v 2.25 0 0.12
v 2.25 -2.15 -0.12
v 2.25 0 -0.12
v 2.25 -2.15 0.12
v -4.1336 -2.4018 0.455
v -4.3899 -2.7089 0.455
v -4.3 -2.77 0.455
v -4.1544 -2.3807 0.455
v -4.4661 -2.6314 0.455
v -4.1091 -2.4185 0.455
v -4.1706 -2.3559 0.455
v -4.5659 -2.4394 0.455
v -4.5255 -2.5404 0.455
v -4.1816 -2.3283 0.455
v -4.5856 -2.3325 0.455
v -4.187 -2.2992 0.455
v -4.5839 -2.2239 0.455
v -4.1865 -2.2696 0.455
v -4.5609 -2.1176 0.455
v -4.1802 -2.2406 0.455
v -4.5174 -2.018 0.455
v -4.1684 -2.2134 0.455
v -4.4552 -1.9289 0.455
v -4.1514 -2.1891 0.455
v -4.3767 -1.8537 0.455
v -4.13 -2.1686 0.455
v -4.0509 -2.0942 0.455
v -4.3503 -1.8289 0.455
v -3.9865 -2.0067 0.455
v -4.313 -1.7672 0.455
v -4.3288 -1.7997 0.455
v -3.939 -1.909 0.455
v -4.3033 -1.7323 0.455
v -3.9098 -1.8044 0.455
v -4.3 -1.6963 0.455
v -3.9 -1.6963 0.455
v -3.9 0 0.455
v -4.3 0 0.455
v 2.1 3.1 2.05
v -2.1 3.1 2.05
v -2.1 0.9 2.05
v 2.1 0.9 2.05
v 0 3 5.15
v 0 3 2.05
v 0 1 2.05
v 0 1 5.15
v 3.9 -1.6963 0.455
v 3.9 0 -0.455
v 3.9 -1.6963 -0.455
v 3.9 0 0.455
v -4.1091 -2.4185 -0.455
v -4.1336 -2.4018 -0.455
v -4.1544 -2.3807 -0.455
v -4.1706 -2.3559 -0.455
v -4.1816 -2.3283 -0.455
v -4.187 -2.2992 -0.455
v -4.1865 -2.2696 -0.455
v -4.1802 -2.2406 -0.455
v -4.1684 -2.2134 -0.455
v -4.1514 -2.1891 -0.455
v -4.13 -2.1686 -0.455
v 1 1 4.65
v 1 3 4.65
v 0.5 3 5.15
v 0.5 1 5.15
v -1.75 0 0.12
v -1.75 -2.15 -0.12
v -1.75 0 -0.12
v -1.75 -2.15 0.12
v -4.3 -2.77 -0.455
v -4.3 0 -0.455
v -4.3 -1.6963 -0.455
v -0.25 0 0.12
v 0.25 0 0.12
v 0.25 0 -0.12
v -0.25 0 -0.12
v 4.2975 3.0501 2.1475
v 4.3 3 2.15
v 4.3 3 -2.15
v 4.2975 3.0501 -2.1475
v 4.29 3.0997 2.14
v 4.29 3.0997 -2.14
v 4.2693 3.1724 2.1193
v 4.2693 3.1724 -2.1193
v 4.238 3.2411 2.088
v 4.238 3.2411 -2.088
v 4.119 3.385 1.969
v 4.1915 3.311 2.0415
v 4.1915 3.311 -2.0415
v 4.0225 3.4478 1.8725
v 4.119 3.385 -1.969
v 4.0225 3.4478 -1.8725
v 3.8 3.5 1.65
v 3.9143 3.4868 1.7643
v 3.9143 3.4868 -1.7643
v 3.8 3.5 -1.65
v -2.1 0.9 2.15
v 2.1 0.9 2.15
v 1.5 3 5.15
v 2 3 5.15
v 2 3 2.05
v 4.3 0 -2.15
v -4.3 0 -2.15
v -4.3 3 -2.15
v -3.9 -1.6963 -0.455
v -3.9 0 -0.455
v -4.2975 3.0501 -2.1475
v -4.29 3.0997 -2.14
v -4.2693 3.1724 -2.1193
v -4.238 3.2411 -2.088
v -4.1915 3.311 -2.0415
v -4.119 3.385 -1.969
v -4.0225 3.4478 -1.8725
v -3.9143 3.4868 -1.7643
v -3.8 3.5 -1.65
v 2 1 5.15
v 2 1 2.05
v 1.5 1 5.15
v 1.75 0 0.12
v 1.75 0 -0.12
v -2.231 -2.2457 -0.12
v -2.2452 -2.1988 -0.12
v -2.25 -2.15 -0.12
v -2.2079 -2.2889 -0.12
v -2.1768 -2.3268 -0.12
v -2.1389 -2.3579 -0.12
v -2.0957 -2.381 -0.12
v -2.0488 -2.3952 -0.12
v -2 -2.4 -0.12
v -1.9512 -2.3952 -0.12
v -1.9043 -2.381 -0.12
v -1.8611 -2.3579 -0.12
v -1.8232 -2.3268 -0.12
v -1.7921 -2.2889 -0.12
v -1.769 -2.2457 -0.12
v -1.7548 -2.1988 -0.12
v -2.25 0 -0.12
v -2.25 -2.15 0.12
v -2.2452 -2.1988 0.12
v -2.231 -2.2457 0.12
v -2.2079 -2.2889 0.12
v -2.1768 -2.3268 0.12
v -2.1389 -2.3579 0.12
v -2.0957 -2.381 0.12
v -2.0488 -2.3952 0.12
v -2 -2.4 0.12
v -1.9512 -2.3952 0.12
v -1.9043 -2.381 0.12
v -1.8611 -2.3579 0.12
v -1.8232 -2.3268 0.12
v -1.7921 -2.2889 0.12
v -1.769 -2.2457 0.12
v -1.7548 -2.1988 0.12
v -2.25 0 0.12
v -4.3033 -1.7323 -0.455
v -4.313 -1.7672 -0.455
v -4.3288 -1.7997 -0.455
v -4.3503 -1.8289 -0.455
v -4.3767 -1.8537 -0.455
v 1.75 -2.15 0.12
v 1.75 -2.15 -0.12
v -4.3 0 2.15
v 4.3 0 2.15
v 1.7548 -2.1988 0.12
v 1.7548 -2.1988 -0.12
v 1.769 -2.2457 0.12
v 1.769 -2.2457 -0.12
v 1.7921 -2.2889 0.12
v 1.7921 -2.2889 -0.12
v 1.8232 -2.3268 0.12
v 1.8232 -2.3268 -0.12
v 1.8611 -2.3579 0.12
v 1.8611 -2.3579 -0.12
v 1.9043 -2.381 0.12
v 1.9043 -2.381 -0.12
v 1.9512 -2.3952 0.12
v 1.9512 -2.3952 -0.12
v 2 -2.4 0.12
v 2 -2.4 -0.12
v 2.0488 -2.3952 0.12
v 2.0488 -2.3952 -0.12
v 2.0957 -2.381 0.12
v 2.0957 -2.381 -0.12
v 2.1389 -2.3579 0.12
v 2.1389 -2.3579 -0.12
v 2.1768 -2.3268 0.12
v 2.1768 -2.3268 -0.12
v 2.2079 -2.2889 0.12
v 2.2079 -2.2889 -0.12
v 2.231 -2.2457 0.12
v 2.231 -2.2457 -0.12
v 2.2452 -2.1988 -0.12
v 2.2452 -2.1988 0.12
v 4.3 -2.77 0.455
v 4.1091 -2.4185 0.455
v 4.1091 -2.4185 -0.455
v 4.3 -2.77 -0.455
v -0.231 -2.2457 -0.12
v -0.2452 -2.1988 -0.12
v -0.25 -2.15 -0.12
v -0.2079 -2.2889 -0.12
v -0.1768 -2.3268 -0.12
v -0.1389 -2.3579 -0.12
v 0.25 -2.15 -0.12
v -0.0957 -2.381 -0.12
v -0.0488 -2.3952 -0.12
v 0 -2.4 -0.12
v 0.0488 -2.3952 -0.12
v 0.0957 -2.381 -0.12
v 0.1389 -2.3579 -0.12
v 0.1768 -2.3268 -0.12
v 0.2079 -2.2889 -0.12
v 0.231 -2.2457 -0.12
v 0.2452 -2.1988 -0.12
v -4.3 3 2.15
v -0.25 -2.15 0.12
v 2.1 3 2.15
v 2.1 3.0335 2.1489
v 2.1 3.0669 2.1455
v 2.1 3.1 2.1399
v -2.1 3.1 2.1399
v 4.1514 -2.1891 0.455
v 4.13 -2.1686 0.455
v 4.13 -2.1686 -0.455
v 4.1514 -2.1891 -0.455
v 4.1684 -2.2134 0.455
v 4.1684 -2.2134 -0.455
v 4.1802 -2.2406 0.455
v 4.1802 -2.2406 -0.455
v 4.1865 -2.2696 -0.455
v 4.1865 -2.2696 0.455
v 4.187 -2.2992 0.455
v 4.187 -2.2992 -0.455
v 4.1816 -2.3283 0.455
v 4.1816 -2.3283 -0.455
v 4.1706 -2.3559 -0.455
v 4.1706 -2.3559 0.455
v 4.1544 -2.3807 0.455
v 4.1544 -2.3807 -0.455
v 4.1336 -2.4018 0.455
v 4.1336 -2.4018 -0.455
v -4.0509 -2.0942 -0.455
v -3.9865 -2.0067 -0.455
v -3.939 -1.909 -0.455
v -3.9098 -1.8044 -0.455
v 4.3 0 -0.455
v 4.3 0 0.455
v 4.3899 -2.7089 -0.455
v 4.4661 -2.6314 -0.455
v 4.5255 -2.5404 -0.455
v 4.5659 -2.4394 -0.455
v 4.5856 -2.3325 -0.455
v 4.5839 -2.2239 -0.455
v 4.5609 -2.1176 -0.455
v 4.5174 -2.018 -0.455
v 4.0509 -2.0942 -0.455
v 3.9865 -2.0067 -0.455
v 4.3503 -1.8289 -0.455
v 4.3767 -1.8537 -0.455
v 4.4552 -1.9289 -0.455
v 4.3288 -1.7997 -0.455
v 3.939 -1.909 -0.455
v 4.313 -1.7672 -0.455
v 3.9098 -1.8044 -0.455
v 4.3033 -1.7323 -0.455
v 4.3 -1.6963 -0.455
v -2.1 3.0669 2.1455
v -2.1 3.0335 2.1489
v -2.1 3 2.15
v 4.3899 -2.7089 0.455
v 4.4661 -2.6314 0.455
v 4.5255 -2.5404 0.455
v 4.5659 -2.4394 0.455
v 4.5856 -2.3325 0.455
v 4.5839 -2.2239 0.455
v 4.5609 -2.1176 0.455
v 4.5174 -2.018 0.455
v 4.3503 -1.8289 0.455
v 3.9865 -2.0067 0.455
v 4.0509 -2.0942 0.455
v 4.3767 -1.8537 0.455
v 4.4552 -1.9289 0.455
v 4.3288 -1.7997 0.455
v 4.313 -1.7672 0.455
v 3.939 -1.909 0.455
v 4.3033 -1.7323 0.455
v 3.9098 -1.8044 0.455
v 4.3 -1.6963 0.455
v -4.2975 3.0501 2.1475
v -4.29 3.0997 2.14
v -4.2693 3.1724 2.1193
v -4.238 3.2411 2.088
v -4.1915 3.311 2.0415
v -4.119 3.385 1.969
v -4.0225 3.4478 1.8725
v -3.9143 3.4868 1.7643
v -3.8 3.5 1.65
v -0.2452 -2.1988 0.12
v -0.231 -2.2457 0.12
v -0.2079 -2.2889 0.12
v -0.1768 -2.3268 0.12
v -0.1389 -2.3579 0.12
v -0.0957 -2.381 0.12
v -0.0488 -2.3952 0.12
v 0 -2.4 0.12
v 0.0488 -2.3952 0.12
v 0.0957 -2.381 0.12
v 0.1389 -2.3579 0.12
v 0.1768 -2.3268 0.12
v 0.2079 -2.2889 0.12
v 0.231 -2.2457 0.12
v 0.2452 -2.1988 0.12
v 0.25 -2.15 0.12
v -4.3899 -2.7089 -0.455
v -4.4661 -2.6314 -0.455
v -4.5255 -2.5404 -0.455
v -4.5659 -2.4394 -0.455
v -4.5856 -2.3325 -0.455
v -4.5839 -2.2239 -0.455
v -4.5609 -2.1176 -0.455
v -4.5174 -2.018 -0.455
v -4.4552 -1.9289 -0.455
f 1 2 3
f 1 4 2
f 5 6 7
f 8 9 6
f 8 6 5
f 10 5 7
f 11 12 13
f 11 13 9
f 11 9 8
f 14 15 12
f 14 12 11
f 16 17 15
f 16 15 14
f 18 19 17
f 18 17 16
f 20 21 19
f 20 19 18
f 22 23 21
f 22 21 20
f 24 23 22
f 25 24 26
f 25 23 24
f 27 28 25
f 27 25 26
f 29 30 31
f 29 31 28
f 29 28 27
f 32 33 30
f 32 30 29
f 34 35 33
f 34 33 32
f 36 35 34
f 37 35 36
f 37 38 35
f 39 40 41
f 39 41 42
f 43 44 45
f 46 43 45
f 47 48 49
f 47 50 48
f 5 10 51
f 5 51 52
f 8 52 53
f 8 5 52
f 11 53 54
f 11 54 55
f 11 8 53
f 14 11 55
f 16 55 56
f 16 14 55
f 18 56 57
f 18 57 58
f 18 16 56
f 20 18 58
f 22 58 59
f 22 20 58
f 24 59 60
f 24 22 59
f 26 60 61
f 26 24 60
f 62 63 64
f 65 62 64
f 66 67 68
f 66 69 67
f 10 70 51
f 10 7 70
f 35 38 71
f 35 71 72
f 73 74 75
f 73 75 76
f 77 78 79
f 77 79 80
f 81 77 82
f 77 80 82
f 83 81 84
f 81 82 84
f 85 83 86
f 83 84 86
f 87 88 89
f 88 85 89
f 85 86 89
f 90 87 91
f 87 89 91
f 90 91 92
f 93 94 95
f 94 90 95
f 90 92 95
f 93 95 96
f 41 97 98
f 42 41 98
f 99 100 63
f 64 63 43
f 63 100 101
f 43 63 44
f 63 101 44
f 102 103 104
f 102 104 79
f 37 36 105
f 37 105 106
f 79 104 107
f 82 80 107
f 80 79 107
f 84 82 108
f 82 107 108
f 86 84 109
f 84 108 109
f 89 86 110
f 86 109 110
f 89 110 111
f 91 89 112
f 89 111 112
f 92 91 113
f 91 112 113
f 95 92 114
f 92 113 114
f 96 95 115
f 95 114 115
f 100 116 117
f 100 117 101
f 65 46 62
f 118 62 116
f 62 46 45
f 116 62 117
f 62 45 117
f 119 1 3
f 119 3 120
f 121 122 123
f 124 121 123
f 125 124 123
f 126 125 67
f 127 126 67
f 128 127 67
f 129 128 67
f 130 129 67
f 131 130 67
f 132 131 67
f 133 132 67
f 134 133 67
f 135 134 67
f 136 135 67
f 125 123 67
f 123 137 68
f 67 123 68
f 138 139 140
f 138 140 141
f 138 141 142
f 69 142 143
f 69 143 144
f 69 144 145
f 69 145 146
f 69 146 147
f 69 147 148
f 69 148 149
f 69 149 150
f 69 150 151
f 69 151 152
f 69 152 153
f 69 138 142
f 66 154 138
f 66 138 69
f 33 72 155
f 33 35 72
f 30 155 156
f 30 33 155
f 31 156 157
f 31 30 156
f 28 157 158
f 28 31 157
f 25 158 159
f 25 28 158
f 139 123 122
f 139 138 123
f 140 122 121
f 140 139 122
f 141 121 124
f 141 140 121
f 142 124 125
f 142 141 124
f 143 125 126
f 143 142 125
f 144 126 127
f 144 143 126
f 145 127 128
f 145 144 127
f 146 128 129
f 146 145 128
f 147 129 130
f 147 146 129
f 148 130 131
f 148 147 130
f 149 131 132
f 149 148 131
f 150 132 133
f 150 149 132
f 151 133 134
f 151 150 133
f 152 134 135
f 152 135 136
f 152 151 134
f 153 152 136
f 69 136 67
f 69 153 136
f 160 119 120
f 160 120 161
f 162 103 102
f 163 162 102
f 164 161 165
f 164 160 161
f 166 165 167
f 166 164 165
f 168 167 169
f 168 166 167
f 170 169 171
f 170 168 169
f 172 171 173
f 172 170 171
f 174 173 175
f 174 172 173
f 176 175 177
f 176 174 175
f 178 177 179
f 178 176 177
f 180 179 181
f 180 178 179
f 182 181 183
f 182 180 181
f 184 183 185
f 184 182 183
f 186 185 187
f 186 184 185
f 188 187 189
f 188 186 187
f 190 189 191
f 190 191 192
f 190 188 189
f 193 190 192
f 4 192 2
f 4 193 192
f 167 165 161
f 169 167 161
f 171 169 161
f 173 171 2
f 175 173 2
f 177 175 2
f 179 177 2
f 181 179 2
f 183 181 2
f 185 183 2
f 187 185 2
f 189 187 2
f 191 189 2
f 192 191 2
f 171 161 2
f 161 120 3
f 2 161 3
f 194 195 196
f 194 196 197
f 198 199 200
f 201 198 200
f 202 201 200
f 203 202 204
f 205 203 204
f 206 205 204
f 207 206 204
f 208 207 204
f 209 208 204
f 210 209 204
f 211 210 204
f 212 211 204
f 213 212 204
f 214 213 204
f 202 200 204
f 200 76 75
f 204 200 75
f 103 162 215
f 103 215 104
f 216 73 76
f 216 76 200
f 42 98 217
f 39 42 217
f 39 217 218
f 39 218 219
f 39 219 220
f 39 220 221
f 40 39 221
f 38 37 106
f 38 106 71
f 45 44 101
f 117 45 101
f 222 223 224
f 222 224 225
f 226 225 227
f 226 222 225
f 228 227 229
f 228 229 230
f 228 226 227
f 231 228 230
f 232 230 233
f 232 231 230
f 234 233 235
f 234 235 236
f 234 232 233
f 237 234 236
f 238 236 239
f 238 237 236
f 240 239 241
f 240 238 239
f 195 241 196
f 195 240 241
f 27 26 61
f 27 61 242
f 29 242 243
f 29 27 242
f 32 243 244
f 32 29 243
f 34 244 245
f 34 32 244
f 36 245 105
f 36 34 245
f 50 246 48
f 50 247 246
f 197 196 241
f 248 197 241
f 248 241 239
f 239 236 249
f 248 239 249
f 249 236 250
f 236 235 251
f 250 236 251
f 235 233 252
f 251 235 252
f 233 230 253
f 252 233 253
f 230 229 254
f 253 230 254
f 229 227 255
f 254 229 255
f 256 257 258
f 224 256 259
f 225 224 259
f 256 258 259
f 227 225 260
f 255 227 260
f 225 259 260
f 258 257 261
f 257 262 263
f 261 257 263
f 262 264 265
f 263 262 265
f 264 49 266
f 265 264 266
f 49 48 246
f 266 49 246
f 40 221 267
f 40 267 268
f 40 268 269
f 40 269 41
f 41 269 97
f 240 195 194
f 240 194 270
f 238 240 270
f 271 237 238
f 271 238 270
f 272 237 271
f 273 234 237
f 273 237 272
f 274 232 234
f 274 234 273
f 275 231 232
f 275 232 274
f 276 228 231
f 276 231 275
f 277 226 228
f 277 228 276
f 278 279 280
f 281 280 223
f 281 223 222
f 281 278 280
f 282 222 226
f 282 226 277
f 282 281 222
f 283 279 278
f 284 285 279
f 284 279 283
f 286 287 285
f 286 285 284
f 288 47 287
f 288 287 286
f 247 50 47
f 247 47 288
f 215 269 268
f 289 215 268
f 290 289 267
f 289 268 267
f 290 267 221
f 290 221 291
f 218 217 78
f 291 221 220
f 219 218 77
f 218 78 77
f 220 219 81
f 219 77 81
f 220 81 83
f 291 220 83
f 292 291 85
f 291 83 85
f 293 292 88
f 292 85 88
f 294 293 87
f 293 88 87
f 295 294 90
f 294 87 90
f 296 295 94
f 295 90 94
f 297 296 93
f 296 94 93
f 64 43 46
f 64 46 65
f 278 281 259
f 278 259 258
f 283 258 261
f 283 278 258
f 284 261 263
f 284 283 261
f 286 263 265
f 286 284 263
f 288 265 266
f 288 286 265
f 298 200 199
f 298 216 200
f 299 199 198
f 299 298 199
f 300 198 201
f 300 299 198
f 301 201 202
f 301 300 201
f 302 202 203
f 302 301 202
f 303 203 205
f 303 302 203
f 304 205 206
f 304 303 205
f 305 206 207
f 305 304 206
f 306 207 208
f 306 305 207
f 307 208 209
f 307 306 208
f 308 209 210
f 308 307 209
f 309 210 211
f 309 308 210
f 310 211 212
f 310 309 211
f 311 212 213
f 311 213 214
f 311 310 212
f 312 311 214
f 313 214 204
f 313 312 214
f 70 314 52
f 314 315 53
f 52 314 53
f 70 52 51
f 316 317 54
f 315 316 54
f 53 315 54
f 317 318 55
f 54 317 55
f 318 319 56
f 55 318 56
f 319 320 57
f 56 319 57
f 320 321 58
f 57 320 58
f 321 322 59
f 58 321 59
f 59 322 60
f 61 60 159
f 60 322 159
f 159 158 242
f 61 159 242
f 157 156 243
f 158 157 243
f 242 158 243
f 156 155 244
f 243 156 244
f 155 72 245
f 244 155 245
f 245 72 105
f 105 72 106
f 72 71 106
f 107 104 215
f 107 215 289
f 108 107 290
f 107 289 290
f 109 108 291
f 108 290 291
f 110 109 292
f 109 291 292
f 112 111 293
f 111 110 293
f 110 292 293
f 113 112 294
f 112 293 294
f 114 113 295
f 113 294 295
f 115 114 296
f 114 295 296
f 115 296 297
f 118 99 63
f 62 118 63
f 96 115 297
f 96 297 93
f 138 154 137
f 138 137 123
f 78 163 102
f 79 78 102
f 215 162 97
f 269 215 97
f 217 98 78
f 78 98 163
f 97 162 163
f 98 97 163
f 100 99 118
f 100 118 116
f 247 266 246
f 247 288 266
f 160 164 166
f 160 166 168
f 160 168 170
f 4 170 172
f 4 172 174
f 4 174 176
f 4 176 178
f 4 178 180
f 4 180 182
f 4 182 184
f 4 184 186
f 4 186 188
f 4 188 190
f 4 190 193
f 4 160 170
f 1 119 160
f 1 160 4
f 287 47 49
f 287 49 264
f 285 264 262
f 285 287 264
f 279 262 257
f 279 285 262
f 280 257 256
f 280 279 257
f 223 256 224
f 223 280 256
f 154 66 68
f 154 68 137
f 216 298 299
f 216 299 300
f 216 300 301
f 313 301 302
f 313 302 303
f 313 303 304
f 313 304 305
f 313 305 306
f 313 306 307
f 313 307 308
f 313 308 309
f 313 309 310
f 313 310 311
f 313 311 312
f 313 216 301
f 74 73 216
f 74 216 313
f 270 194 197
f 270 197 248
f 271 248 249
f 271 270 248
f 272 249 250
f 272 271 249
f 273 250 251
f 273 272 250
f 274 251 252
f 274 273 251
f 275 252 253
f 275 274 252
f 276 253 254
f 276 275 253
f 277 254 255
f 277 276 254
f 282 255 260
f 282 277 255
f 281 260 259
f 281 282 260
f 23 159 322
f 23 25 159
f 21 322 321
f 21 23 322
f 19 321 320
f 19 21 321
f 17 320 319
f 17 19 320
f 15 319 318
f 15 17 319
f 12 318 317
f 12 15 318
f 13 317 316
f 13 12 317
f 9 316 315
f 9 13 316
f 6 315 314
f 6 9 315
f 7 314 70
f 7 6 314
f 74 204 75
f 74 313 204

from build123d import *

# Parameters (mm, degrees)
SKETCH1_W             = 8.6
SKETCH1_H             = 4.3
BOSS_EXTRUDE1_DEPTH   = 3.5
BOSS_EXTRUDE2_DEPTH   = 0.455
BOSS_EXTRUDE2_2_DEPTH = 0.455
BOSS_EXTRUDE3_DEPTH   = 0.12
BOSS_EXTRUDE3_2_DEPTH = 0.12
BOSS_EXTRUDE3_3_DEPTH = 0.12
CUT_EXTRUDE1_DEPTH    = 0.1
BOSS_EXTRUDE4_DEPTH   = 3.1
CUT_EXTRUDE2_DEPTH    = 9.992249788
FILLET1_R             = 0.5


with BuildPart() as part:
    # Sketch1 → Boss-Extrude1 (new body)
    with BuildSketch(Plane(origin=(0, 0, 0), x_dir=(1, 0, 0), z_dir=(0, 1, 0))):
        Rectangle(SKETCH1_W, SKETCH1_H)
    extrude(amount=BOSS_EXTRUDE1_DEPTH)

    # Sketch4 → Cut-Extrude1 (cut)
    with BuildSketch(Plane.XY.offset(2.15)):
        Polygon((2.1, 0.9), (2.1, 3.1), (1.5, 3.1), (1, 3.1), (0.5, 3.1), (-0.5, 3.1), (-1, 3.1), (-1.5, 3.1), (-2.1, 3.1), (-2.1, 0.9), (-1.5, 0.9), (-1, 0.9), (-0.5, 0.9), (0.5, 0.9), (1, 0.9), (1.5, 0.9), align=None)
    extrude(amount=-CUT_EXTRUDE1_DEPTH, mode=Mode.SUBTRACT)

    # Fillet1
    # the kernel refuses this fillet: 0.5 mm, written as the material it takes off along each edge
    with BuildSketch(Plane(origin=(-4.3, 3.5, 3.4), x_dir=(1, 0, 0), z_dir=(0, 0, -1))) as fillet1_piece_1:
        with BuildLine():
            CenterArc((FILLET1_R, FILLET1_R), FILLET1_R, 180, 90)
            Line((0, FILLET1_R), (0, 0))
            Line((0, 0), (FILLET1_R, 0))
        make_face()
    extrude(amount=6.8, mode=Mode.SUBTRACT)
    with BuildSketch(Plane(origin=(-5.55, 3.5, -2.15), x_dir=(0, 0, 1), z_dir=(1, 0, 0))) as fillet1_piece_2:
        with BuildLine():
            CenterArc((FILLET1_R, FILLET1_R), FILLET1_R, 180, 90)
            Line((0, FILLET1_R), (0, 0))
            Line((0, 0), (FILLET1_R, 0))
        make_face()
    extrude(amount=11.1, mode=Mode.SUBTRACT)
    with BuildSketch(Plane(origin=(4.3, 3.5, -3.4), x_dir=(0, -1, 0), z_dir=(0, 0, 1))) as fillet1_piece_3:
        with BuildLine():
            CenterArc((FILLET1_R, -FILLET1_R), FILLET1_R, 90, 90)
            Line((0, -FILLET1_R), (0, 0))
            Line((0, 0), (FILLET1_R, 0))
        make_face()
    extrude(amount=6.8, mode=Mode.SUBTRACT)
    with BuildSketch(Plane(origin=(5.55, 3.5, 2.15), x_dir=(0, -1, 0), z_dir=(-1, 0, 0))) as fillet1_piece_4:
        with BuildLine():
            CenterArc((FILLET1_R, -FILLET1_R), FILLET1_R, 90, 90)
            Line((0, -FILLET1_R), (0, 0))
            Line((0, 0), (FILLET1_R, 0))
        make_face()
    extrude(amount=11.1, mode=Mode.SUBTRACT)


with BuildPart() as body_2:
    # Sketch2 → Boss-Extrude2 (new, symmetric)
    with BuildSketch(Plane.XY):
        with BuildLine():
            Line((3.9, 0), (3.9, -1.696266343))
            ThreePointArc((3.9, -1.696266343), (3.960555842, -1.958944854), (4.13, -2.16860097))
            ThreePointArc((4.13, -2.16860097), (4.18697768, -2.299191552), (4.109090909, -2.41849791))
            Line((4.109090909, -2.41849791), (4.3, -2.77))
            ThreePointArc((4.3, -2.77), (4.585584827, -2.332543353), (4.376666667, -1.853711219))
            ThreePointArc((4.376666667, -1.853711219), (4.320185281, -1.783825846), (4.3, -1.696266343))
            Line((4.3, -1.696266343), (4.3, 0))
            Line((4.3, 0), (3.9, 0))
        make_face()
    extrude(amount=BOSS_EXTRUDE2_DEPTH, both=True)


with BuildPart() as body_3:
    # Sketch2 → Boss-Extrude2 2 (new, symmetric)
    with BuildSketch(Plane.XY):
        with BuildLine():
            Line((-4.3, -2.77), (-4.109090909, -2.41849791))
            ThreePointArc((-4.109090909, -2.41849791), (-4.18697768, -2.299191552), (-4.13, -2.16860097))
            ThreePointArc((-4.13, -2.16860097), (-3.960555842, -1.958944854), (-3.9, -1.696266343))
            Line((-3.9, -1.696266343), (-3.9, 0))
            Line((-3.9, 0), (-4.3, 0))
            Line((-4.3, 0), (-4.3, -1.696266343))
            ThreePointArc((-4.3, -1.696266343), (-4.320185281, -1.783825846), (-4.376666667, -1.853711219))
            ThreePointArc((-4.376666667, -1.853711219), (-4.585584827, -2.332543353), (-4.3, -2.77))
        make_face()
    extrude(amount=BOSS_EXTRUDE2_2_DEPTH, both=True)


with BuildPart() as body_4:
    # Sketch3 → Boss-Extrude3 (new, symmetric)
    with BuildSketch(Plane.XY):
        with BuildLine():
            Line((2.25, -2.15), (2.25, 0))
            Line((2.25, 0), (1.75, 0))
            Line((1.75, 0), (1.75, -2.15))
            ThreePointArc((1.75, -2.15), (2, -2.4), (2.25, -2.15))
        make_face()
    extrude(amount=BOSS_EXTRUDE3_DEPTH, both=True)


with BuildPart() as body_5:
    # Sketch3 → Boss-Extrude3 2 (new, symmetric)
    with BuildSketch(Plane.XY):
        with BuildLine():
            Line((0.25, -2.15), (0.25, 0))
            Line((0.25, 0), (-0.25, 0))
            Line((-0.25, 0), (-0.25, -2.15))
            ThreePointArc((-0.25, -2.15), (0, -2.4), (0.25, -2.15))
        make_face()
    extrude(amount=BOSS_EXTRUDE3_2_DEPTH, both=True)


with BuildPart() as body_6:
    # Sketch3 → Boss-Extrude3 3 (new, symmetric)
    with BuildSketch(Plane.XY):
        with BuildLine():
            Line((-1.75, -2.15), (-1.75, 0))
            Line((-1.75, 0), (-2.25, 0))
            Line((-2.25, 0), (-2.25, -2.15))
            ThreePointArc((-2.25, -2.15), (-2, -2.4), (-1.75, -2.15))
        make_face()
    extrude(amount=BOSS_EXTRUDE3_3_DEPTH, both=True)


with BuildPart() as body_7:
    # Sketch5 → Boss-Extrude4 (new body)
    with BuildSketch(Plane.XY.offset(2.05)):
        Polygon((0.5, 3), (0, 3), (0, 1), (0.5, 1), (1, 1), (1.5, 1), (2, 1), (2, 3), (1.5, 3), (1, 3), align=None)
    extrude(amount=BOSS_EXTRUDE4_DEPTH)

    # Sketch6 → Cut-Extrude2 (cut, through all)
    with BuildSketch(Plane(origin=(0, 3, 0), x_dir=(1, 0, 0), z_dir=(0, 1, 0))):
        Polygon((0.5, -5.15), (1.5, -5.15), (1, -4.65), align=None)
    extrude(amount=-CUT_EXTRUDE2_DEPTH, mode=Mode.SUBTRACT)


solid = Compound([part.part, body_2.part, body_3.part, body_4.part, body_5.part, body_6.part, body_7.part])
